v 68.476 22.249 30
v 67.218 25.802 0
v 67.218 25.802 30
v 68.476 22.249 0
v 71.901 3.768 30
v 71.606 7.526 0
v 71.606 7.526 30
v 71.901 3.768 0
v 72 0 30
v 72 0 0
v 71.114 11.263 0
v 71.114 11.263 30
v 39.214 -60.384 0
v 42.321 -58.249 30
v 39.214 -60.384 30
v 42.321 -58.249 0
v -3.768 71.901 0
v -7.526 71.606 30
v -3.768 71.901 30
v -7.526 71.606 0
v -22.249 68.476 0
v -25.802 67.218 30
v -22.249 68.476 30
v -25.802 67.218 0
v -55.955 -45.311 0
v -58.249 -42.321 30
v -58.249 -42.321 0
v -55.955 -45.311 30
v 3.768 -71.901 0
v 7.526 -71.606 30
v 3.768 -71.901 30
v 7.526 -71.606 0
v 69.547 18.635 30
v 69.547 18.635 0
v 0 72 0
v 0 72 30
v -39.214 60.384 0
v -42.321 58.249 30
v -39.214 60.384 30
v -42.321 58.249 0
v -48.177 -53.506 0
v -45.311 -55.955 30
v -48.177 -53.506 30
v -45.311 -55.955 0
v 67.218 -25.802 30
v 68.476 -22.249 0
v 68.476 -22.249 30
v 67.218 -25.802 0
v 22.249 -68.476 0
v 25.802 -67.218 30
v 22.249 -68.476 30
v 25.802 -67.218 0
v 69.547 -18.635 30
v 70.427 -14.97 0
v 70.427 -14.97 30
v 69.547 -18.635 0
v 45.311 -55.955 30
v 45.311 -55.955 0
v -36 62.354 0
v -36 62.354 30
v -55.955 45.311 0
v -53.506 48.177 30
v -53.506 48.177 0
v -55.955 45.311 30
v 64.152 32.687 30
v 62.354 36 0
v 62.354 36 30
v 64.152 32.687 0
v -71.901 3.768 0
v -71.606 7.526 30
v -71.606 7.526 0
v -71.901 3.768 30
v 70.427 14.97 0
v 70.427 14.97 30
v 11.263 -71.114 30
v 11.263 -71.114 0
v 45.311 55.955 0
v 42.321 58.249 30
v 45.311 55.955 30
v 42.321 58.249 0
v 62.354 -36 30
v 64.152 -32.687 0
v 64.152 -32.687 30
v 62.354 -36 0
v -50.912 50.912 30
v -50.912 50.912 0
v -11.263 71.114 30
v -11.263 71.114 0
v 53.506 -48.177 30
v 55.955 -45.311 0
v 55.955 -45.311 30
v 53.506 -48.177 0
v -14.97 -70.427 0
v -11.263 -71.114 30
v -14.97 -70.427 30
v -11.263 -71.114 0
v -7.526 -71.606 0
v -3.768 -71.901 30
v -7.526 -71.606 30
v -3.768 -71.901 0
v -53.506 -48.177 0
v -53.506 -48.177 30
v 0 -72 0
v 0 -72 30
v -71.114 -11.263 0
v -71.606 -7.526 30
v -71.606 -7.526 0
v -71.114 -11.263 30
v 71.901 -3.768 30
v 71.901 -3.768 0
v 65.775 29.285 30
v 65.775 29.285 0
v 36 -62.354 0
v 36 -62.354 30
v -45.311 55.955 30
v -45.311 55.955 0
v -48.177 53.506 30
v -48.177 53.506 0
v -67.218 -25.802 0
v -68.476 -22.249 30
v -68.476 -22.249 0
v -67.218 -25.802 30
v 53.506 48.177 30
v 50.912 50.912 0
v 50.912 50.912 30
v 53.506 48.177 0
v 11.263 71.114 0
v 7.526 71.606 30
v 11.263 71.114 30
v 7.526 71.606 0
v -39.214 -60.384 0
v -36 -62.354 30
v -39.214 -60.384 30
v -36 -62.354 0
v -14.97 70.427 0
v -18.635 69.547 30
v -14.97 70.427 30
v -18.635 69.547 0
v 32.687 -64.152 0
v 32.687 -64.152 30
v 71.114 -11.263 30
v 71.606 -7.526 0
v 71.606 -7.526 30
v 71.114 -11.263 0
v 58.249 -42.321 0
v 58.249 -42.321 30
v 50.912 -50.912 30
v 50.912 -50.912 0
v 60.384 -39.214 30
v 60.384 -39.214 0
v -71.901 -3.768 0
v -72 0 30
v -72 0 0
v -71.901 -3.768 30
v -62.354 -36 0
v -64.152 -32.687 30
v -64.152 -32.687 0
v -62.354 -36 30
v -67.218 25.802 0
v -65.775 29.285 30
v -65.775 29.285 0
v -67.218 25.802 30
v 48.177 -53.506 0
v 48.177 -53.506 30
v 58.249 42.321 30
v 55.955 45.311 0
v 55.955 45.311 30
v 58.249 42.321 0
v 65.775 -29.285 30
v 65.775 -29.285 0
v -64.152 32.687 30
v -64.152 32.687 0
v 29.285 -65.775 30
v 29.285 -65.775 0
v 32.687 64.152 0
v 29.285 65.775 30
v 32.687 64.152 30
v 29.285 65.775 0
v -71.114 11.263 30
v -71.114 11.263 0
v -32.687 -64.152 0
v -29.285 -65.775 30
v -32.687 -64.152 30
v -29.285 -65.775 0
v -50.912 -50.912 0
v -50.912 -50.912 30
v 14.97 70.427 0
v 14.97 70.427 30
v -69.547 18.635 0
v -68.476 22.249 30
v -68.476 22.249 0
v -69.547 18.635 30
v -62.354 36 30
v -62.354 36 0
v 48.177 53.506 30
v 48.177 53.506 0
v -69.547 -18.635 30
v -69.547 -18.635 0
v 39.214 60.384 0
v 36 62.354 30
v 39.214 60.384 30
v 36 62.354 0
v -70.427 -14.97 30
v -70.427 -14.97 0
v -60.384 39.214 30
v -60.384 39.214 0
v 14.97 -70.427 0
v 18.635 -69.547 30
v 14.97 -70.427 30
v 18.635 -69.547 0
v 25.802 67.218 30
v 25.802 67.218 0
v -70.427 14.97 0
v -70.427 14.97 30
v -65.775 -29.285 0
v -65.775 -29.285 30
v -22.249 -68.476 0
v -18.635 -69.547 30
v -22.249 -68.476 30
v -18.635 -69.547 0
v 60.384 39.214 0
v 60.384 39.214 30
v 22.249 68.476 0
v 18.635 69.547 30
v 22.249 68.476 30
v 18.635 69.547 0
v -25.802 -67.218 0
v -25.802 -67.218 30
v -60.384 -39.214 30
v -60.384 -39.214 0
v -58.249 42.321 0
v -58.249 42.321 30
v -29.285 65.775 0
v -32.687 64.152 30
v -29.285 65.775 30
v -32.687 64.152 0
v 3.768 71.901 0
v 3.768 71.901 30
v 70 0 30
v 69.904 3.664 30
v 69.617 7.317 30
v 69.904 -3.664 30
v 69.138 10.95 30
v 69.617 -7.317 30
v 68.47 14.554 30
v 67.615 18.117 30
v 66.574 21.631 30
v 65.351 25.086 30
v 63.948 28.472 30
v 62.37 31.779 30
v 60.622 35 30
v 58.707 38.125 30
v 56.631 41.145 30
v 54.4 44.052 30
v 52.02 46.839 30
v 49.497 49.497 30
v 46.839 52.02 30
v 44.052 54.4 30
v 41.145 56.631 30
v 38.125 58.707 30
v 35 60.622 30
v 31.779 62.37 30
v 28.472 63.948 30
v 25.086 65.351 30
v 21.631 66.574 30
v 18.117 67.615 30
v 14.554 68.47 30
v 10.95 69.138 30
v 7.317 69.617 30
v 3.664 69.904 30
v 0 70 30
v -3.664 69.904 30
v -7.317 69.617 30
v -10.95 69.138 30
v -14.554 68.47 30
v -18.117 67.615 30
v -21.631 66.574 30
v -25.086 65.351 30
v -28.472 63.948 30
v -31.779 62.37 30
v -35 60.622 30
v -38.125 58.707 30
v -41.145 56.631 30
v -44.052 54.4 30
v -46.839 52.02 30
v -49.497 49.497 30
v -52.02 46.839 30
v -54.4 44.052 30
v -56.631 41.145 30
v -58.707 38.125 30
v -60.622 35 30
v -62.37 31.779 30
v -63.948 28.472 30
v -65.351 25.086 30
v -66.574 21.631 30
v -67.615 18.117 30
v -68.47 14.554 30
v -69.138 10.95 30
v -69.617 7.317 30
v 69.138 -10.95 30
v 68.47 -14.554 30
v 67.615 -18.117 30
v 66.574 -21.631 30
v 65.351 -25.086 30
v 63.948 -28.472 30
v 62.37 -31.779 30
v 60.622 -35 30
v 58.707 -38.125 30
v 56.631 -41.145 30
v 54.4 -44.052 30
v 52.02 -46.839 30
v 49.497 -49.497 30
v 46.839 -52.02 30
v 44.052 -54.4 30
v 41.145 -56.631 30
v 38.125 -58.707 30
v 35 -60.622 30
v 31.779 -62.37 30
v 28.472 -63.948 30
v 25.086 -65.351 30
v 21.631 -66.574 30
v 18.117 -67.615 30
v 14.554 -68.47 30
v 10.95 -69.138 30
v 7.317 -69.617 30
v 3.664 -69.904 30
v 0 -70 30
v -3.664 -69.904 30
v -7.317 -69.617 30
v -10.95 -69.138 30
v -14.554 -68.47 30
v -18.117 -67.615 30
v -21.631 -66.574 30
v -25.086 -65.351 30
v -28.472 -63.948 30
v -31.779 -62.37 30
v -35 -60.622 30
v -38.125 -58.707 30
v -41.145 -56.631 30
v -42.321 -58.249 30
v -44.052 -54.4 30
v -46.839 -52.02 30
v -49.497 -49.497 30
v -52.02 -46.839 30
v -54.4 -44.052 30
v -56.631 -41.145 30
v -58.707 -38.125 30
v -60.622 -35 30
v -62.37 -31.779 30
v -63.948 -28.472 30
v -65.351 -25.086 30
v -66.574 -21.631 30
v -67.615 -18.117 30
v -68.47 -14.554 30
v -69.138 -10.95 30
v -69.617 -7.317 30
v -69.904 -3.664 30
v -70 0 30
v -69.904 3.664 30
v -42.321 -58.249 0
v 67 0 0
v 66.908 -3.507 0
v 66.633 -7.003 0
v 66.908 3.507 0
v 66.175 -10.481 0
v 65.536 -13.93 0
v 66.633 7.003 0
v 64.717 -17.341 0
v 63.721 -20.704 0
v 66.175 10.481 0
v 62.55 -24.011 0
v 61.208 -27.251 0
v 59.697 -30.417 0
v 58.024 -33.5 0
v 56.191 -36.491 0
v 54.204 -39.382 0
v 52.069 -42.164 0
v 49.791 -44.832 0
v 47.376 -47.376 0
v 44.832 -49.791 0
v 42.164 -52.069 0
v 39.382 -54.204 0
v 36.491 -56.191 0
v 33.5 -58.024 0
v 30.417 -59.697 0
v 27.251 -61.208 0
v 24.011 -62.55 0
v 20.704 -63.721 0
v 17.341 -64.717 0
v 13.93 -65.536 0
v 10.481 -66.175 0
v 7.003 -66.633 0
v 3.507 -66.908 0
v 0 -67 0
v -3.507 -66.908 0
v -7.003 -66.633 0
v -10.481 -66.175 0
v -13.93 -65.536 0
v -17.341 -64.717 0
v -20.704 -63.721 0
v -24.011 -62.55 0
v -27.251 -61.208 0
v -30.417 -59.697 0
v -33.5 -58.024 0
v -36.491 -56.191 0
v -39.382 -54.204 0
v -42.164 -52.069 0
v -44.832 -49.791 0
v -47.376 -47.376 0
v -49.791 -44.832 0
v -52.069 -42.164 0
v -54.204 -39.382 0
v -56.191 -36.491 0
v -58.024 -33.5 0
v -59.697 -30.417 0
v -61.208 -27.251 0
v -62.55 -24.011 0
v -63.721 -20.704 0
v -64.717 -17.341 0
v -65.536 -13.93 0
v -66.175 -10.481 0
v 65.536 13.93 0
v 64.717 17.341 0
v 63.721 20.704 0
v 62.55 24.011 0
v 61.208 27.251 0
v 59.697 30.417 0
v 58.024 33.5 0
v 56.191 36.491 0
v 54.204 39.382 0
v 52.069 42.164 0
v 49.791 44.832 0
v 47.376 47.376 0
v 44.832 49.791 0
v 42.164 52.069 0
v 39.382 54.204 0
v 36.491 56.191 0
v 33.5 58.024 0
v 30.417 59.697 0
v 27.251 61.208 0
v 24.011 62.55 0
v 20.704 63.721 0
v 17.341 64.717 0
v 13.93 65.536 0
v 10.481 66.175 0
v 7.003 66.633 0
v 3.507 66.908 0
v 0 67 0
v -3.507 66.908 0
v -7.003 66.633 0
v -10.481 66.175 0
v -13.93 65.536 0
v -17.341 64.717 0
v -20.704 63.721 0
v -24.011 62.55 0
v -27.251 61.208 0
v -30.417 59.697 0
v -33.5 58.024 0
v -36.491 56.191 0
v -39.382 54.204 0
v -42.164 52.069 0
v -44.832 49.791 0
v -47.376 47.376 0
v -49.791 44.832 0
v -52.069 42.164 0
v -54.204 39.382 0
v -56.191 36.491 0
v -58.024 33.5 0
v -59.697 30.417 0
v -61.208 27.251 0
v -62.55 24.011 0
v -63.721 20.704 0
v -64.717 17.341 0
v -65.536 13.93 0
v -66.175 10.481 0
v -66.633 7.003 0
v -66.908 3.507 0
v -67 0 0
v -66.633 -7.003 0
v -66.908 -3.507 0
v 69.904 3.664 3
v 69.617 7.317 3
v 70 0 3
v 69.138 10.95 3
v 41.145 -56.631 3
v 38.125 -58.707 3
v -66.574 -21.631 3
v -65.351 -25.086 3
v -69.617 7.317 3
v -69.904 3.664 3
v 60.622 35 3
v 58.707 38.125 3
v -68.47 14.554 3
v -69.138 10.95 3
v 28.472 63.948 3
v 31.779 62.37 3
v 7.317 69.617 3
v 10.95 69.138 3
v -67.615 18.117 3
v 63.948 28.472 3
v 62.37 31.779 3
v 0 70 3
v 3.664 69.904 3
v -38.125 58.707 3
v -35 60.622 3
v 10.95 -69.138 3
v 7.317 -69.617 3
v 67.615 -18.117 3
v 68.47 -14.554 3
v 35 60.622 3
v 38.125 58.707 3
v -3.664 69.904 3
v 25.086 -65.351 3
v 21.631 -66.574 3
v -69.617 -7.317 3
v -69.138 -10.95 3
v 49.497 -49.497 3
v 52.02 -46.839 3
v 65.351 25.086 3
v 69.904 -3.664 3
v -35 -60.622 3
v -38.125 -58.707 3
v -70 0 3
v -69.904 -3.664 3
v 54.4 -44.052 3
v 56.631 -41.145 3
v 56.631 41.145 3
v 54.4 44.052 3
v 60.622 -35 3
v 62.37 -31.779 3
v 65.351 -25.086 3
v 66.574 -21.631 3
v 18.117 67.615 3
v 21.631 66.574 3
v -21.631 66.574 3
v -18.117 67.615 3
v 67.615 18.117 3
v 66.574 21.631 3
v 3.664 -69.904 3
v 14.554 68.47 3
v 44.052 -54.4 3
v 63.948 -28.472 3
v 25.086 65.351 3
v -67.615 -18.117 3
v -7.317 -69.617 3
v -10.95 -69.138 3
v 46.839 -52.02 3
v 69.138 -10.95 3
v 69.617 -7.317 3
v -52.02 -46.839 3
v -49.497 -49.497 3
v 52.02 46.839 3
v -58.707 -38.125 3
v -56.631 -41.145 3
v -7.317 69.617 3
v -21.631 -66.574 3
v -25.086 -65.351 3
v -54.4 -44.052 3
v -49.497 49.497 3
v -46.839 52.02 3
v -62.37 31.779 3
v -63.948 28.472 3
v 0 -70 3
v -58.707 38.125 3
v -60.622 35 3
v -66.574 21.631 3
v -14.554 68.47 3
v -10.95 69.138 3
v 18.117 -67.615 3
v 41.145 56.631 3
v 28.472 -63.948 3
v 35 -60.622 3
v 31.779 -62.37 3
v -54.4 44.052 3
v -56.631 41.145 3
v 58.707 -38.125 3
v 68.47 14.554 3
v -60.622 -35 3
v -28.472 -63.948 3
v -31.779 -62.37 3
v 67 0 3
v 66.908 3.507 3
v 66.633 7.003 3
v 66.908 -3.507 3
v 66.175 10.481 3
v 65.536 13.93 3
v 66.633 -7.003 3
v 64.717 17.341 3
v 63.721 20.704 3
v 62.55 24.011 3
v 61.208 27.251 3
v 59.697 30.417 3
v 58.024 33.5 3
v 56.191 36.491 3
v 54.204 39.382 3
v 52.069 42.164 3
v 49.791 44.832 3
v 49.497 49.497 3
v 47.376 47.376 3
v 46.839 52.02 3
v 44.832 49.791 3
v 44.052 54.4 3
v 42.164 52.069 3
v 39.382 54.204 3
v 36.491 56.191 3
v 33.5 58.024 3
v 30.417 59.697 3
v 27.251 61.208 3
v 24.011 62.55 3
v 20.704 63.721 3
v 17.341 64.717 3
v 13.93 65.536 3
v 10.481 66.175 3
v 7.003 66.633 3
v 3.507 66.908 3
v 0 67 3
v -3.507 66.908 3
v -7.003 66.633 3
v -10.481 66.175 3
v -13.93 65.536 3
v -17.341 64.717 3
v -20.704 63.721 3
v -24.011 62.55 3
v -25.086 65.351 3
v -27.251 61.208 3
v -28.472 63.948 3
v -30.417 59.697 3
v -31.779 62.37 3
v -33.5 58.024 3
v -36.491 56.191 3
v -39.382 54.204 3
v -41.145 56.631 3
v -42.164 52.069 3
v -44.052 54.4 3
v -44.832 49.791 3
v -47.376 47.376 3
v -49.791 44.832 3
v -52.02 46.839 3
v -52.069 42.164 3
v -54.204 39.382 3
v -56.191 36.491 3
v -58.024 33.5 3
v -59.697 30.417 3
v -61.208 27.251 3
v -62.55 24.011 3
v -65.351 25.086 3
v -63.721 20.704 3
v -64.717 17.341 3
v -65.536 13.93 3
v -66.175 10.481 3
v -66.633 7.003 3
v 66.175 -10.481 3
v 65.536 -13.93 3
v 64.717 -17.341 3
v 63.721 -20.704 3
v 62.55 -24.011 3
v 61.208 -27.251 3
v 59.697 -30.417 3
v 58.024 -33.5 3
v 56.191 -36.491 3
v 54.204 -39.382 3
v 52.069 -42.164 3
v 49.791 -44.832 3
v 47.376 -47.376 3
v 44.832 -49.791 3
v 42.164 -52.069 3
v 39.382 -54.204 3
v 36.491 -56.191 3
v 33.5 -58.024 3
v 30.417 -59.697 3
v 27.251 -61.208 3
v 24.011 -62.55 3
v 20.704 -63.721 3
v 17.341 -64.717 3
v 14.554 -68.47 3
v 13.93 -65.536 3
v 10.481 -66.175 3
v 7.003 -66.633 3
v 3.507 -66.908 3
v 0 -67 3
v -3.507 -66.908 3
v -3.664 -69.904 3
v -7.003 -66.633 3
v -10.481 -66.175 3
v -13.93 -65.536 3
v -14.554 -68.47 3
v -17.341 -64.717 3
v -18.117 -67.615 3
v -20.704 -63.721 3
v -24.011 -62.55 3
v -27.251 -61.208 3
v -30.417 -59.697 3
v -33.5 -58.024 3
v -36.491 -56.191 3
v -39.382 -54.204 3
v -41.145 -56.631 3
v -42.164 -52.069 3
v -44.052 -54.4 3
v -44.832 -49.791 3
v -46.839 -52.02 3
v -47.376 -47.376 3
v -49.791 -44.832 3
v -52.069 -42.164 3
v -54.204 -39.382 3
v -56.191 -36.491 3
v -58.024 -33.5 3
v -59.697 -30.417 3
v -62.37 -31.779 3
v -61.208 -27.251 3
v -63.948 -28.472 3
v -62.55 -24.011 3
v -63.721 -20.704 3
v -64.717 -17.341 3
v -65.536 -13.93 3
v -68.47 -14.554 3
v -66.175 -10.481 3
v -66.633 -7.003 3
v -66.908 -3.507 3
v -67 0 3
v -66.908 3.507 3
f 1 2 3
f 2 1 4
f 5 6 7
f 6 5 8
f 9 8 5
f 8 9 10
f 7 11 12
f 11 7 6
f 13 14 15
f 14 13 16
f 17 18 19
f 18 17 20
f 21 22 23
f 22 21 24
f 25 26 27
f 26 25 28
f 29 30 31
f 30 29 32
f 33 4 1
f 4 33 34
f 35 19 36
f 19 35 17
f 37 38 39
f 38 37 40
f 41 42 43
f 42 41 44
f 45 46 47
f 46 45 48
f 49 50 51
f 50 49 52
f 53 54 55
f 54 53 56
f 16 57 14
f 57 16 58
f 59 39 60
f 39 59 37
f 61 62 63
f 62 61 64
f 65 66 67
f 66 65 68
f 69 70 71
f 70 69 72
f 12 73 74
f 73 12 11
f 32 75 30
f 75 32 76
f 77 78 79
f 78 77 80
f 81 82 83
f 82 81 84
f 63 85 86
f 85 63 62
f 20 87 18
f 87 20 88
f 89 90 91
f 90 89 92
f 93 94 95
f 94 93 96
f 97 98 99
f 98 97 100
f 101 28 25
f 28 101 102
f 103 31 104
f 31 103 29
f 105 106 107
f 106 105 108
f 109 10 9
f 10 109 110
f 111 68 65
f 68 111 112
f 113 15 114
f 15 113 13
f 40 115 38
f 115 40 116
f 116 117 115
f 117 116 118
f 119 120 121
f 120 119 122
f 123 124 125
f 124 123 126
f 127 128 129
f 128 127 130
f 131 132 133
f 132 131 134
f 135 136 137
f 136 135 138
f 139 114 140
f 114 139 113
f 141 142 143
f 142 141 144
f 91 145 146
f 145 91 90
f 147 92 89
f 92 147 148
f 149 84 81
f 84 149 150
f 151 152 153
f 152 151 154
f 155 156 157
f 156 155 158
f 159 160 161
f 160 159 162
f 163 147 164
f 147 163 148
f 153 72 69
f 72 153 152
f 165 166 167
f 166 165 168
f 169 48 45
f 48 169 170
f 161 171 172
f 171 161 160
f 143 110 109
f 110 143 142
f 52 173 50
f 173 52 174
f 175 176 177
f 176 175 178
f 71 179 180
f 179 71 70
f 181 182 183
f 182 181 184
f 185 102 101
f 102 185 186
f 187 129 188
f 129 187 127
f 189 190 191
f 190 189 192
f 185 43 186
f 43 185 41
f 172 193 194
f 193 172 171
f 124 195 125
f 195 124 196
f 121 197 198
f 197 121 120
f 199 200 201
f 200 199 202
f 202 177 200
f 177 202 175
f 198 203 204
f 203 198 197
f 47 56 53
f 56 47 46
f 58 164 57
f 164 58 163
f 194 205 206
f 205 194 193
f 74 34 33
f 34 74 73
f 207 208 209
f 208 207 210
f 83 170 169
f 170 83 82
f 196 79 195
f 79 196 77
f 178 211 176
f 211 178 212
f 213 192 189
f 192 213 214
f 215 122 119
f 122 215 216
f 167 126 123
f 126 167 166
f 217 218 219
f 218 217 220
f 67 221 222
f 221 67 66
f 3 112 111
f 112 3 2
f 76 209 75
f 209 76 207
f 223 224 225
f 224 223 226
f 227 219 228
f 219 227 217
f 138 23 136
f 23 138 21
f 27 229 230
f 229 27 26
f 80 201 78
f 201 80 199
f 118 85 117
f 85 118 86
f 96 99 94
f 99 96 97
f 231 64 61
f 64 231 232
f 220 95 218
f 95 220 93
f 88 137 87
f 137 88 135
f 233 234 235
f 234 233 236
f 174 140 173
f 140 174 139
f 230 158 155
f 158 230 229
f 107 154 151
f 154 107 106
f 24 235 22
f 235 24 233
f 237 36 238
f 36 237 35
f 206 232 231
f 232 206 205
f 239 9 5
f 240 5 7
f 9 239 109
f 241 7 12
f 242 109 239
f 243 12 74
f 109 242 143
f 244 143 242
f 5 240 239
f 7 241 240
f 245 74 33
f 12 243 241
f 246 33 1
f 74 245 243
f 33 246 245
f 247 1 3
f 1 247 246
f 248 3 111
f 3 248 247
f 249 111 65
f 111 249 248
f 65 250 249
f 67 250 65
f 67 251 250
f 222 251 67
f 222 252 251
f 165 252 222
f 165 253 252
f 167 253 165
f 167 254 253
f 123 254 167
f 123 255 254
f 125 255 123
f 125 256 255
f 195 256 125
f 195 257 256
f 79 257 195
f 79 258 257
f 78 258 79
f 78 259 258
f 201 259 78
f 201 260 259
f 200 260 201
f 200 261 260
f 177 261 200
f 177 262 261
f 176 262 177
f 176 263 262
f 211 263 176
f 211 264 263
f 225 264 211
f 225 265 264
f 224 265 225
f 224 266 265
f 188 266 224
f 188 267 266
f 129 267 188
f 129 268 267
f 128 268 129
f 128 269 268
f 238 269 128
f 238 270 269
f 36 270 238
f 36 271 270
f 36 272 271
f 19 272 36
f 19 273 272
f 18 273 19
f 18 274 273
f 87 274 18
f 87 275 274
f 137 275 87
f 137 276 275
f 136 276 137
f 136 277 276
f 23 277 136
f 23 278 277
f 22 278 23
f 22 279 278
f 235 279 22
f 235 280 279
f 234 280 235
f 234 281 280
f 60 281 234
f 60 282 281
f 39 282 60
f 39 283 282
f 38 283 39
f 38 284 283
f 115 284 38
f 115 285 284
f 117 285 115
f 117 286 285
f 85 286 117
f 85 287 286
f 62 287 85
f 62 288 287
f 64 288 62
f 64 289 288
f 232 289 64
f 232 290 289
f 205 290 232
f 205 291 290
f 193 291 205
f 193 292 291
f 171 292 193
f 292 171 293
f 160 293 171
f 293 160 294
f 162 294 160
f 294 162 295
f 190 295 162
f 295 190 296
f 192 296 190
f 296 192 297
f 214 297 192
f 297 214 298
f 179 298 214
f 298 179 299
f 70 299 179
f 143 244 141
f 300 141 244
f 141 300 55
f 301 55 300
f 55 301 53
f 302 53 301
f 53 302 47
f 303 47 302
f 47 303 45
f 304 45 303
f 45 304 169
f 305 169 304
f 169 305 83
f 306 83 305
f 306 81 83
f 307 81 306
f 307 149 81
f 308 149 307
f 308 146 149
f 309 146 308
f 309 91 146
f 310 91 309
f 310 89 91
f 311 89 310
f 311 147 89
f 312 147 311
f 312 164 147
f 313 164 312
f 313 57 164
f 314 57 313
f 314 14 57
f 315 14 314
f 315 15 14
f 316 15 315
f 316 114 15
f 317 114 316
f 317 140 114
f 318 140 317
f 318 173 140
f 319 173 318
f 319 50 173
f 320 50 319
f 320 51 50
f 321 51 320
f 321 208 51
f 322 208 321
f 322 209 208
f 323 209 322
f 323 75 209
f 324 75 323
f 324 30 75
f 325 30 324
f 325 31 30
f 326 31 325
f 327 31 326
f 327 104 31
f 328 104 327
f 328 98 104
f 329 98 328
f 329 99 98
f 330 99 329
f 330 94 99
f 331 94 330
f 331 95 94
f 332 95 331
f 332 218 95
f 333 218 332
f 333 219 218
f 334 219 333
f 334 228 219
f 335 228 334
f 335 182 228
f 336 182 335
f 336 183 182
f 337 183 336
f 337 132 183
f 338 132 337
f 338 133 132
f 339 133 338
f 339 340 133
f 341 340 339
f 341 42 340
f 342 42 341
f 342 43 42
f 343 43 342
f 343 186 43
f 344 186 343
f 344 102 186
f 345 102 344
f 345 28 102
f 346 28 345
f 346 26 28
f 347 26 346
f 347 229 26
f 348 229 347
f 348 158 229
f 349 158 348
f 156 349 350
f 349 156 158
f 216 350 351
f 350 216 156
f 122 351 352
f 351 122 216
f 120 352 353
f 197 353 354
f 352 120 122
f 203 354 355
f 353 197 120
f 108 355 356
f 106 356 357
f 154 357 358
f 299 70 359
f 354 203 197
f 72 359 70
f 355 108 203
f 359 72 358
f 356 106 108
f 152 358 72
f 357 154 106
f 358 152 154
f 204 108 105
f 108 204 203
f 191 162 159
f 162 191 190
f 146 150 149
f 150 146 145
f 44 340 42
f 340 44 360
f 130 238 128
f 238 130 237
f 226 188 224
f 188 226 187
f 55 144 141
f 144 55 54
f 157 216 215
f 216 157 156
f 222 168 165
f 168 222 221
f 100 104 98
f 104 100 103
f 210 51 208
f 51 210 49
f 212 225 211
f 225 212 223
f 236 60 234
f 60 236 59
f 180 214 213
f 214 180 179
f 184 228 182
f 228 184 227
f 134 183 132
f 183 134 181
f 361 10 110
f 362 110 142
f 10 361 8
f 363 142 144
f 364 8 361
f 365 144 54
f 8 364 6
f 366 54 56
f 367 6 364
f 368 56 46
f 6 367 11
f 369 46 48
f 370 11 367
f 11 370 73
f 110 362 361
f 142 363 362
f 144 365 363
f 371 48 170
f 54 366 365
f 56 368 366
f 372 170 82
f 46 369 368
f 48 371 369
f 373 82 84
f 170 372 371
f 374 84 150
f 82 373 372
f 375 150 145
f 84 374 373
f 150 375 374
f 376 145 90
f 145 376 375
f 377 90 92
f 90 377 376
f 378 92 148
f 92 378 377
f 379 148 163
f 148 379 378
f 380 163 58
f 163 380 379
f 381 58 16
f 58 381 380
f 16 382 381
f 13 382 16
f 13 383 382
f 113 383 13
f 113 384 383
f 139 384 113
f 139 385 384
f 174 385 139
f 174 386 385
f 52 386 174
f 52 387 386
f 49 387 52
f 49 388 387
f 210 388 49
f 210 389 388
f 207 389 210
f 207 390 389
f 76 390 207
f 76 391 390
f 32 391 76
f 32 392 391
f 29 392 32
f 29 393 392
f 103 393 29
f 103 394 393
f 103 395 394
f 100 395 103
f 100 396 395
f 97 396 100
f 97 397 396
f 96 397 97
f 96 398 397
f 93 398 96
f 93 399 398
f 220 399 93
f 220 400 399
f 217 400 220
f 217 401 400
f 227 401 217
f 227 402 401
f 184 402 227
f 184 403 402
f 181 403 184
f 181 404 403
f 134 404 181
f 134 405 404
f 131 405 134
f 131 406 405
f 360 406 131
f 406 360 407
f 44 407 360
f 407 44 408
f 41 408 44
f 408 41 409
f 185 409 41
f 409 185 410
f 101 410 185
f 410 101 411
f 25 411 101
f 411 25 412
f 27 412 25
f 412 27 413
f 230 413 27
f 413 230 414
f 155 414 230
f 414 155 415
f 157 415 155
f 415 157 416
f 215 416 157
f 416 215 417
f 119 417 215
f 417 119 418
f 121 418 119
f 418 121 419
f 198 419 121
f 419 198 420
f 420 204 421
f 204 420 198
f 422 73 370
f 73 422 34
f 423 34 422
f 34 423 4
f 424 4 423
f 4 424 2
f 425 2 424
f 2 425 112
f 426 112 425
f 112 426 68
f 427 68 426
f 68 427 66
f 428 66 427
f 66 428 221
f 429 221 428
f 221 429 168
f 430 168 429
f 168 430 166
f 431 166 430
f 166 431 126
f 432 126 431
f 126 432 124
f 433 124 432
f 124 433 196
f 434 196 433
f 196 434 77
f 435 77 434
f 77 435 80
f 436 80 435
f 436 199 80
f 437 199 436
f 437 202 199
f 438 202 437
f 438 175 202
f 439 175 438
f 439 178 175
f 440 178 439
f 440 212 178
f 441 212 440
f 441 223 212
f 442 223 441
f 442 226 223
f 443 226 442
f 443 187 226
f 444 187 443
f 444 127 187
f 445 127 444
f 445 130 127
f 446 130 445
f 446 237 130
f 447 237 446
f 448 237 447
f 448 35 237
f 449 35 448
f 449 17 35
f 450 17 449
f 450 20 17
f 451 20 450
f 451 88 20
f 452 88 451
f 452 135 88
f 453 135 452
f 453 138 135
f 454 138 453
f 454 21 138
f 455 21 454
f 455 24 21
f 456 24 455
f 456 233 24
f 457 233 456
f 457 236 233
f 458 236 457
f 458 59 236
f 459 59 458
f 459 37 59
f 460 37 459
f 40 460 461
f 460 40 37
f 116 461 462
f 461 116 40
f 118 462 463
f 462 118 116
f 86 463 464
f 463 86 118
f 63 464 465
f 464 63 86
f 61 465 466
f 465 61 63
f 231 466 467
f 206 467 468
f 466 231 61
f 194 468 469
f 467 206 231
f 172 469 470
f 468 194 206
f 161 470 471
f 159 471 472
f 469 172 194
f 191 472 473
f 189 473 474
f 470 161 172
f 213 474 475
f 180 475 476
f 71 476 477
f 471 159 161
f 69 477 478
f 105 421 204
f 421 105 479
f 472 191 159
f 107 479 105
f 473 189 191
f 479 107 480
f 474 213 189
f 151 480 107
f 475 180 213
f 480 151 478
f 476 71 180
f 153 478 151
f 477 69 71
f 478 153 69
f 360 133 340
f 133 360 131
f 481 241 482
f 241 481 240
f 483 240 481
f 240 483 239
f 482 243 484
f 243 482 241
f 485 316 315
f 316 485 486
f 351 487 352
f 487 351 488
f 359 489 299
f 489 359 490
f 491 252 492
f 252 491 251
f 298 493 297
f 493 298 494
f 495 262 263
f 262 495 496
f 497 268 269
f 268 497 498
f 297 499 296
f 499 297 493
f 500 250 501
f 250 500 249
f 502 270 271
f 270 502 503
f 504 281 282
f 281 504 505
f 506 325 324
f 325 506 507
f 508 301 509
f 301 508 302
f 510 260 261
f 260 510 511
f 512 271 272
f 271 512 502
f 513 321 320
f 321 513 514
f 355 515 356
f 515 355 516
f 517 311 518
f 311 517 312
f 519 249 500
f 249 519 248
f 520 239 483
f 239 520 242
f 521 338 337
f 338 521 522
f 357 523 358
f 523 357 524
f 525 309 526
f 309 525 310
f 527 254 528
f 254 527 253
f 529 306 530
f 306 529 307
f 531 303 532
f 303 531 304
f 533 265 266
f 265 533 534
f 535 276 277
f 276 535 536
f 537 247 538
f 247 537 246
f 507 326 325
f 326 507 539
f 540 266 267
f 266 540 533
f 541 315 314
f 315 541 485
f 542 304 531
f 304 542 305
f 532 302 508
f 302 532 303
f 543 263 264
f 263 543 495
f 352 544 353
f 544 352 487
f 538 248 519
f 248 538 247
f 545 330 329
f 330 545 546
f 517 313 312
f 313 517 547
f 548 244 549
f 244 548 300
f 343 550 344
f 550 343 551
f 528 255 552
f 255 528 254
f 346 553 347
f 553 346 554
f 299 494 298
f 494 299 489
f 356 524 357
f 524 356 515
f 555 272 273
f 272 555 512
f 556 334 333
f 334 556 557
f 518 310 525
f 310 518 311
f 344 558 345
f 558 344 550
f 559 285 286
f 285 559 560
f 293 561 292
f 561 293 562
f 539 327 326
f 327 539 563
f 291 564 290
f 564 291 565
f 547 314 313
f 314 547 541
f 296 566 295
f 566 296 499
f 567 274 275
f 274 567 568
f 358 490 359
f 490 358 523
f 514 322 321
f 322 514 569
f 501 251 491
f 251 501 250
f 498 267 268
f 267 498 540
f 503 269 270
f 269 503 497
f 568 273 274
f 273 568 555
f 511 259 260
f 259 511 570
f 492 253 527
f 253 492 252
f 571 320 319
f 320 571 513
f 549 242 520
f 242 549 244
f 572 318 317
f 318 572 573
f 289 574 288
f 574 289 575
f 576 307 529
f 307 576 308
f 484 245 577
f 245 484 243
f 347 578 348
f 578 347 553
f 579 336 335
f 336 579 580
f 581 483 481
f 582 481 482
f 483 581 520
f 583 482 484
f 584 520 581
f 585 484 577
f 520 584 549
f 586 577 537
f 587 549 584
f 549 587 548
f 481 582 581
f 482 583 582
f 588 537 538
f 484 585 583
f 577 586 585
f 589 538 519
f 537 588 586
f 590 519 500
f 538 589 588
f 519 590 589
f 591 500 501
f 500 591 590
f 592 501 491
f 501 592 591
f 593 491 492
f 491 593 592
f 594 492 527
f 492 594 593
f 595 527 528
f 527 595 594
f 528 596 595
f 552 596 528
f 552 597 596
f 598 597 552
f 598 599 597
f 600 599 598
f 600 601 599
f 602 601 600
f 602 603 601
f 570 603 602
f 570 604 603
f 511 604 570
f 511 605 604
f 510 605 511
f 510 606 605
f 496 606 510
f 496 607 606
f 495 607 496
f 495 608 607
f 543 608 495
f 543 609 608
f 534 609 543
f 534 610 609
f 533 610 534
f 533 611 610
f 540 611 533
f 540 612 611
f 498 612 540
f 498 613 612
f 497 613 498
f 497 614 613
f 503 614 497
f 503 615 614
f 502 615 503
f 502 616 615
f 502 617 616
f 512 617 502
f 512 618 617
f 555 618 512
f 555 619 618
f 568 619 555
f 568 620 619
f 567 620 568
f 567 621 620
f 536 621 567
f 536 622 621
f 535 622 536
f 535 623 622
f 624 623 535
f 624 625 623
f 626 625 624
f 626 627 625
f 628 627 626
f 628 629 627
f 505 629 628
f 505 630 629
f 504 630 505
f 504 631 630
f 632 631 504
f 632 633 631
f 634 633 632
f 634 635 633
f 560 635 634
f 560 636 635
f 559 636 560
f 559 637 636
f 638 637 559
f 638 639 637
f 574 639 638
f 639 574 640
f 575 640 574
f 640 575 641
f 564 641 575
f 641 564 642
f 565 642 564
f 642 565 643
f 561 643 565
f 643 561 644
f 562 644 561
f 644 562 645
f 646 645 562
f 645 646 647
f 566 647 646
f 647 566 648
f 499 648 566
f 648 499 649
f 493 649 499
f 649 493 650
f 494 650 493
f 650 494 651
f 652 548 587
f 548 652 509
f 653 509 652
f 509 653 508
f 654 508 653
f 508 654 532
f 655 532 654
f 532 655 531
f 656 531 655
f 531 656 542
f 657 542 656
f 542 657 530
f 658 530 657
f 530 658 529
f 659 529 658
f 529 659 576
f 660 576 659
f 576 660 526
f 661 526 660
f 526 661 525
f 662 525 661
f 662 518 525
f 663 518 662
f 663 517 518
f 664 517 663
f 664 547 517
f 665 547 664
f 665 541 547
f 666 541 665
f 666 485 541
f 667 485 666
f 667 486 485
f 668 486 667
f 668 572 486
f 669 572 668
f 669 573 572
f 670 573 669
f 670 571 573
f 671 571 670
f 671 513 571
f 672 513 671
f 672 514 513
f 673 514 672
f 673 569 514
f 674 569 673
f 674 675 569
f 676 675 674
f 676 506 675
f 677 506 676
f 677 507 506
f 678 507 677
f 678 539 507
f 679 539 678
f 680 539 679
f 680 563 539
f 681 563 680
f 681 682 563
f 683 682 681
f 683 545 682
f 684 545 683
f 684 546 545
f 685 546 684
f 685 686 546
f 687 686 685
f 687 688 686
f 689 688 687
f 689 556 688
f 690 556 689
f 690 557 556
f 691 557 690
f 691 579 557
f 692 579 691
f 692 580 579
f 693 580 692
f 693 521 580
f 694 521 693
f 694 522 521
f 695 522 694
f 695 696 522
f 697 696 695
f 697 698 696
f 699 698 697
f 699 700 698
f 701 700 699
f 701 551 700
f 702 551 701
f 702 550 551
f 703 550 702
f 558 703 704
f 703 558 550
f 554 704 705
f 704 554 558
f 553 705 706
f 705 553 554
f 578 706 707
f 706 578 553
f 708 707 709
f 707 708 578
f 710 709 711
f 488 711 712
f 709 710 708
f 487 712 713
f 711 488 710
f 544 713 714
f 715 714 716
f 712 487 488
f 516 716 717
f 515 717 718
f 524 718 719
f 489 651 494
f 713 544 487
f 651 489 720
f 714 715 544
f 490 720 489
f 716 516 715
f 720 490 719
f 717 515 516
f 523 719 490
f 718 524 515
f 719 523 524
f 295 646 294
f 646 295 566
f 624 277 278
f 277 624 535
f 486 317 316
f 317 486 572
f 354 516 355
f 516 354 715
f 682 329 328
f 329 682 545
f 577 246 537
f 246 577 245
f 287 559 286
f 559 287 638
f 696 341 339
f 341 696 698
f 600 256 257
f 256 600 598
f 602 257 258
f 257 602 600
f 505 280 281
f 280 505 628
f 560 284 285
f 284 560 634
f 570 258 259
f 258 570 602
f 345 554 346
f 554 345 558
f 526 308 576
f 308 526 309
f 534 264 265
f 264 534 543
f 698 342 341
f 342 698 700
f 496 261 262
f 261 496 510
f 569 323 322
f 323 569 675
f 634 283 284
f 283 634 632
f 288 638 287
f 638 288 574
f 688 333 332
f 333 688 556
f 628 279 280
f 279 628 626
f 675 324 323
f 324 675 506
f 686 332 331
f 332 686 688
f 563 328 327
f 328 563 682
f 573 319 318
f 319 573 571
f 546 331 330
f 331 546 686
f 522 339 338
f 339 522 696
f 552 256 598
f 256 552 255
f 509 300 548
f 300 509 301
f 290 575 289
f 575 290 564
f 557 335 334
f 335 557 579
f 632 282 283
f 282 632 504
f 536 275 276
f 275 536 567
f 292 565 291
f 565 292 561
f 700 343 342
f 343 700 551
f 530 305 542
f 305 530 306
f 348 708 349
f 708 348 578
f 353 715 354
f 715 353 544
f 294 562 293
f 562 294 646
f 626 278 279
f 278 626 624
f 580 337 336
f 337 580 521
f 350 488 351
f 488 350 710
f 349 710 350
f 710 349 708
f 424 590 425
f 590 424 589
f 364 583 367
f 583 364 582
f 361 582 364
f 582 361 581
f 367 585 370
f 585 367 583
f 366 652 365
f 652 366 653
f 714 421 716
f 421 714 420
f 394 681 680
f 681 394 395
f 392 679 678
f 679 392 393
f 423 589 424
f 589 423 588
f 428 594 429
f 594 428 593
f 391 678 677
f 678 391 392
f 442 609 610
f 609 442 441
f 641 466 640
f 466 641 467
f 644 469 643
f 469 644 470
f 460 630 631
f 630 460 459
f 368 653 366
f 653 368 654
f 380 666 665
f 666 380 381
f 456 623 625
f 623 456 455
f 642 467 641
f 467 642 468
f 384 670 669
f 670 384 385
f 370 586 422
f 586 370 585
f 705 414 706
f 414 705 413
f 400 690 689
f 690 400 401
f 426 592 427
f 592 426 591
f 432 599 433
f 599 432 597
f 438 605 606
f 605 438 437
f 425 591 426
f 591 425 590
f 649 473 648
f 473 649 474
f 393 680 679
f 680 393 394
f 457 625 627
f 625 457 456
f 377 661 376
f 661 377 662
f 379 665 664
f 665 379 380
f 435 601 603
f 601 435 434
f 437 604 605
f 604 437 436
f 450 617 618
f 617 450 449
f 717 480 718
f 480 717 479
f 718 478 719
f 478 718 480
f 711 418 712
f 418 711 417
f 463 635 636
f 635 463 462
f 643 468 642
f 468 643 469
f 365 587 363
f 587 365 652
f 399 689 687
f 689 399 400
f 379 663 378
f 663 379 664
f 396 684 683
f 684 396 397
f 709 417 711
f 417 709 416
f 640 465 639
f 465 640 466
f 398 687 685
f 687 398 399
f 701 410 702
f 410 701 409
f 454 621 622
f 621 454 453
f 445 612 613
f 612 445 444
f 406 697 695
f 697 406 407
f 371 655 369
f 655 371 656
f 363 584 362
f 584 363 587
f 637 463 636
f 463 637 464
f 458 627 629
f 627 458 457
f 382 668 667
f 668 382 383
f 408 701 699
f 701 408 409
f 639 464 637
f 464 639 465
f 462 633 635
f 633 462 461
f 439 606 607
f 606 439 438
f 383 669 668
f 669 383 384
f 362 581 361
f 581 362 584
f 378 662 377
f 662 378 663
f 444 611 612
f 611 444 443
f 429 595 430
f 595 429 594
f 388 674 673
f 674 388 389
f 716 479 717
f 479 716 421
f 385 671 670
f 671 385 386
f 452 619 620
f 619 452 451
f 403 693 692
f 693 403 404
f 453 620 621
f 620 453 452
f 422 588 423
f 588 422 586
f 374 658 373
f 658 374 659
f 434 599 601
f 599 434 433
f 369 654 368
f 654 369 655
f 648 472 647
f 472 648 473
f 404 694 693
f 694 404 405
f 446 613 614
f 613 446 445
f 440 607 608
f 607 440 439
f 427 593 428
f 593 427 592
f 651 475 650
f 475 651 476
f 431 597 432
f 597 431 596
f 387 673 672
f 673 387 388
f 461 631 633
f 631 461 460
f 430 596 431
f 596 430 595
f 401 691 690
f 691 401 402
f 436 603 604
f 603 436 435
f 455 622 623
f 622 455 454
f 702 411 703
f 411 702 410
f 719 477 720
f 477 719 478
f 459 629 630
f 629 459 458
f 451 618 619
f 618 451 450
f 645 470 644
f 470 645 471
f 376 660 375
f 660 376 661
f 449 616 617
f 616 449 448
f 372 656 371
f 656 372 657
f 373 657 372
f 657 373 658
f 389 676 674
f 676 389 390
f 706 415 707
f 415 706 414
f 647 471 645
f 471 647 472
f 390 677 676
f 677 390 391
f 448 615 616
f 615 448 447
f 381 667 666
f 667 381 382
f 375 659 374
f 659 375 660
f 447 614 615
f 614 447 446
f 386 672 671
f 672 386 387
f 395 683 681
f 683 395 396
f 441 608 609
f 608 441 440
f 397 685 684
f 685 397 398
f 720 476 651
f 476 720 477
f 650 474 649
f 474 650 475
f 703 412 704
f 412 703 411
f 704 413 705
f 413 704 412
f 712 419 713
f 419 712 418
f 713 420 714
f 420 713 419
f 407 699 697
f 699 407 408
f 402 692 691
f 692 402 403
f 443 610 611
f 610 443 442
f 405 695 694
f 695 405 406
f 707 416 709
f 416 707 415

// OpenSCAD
// Flat Box test diameter by JoJoNeiL
// English Version
// Last Rev = 20 oct. 2016
// Creative Commons - Attribution - Non-Commercial license.
// http://www.thingiverse.com/jojoneil/about
// www.jojoneil.net


// ---
// --- TO BE CUSTOMIZED
// ---

// --- FOOT
// number of sides for the cylinder (more sides will make it smooth, but it will increase the rendering time)
Smooth =       120; 


// outside diameter of dewshield / Diamètre externe du pare buée du telescope
CylDia =      140;
// Height of the cylinder / Hauteur du support où le pare buée s'emboite
CylHt =        30; 
// Thickness of the cylinder / Epaisseur du cylindre
CylThick =      2; 
// Height of the stopper / Hauteur de butée
StopHt =        3; 
// Thickness of the stopper / Epaisseur de butée
StopDia =       3; 


// ---
// --- définition de la piece PIED
// --- FOOT PART
// ---

    difference(){
            union(){
                //Création de la boite principale
                // Cylindre exterieur (pour créer le rebord du cylindre qui s'emboite autour du pare buée)
                translate([0,0,0]) cylinder(h=CylHt,d=CylDia+(CylThick*2),$fn=Smooth);
                // Cylindre pour créer la butée
                cylinder(h=StopHt,d=CylDia-StopDia,$fn=Smooth);
            }
            // Cylindre intérieur pour créer trou du Ø du pare buée en donnant la hauteur de la butée)
            translate([0,0,StopHt]) cylinder(h=CylHt*2,d=CylDia,$fn=Smooth);
            // Cylindre trou du Ø de la butée
            translate([0,0,-1]) cylinder(h=CylHt+2,d=CylDia-(StopDia*2),$fn=Smooth);
     }
  
// ---
